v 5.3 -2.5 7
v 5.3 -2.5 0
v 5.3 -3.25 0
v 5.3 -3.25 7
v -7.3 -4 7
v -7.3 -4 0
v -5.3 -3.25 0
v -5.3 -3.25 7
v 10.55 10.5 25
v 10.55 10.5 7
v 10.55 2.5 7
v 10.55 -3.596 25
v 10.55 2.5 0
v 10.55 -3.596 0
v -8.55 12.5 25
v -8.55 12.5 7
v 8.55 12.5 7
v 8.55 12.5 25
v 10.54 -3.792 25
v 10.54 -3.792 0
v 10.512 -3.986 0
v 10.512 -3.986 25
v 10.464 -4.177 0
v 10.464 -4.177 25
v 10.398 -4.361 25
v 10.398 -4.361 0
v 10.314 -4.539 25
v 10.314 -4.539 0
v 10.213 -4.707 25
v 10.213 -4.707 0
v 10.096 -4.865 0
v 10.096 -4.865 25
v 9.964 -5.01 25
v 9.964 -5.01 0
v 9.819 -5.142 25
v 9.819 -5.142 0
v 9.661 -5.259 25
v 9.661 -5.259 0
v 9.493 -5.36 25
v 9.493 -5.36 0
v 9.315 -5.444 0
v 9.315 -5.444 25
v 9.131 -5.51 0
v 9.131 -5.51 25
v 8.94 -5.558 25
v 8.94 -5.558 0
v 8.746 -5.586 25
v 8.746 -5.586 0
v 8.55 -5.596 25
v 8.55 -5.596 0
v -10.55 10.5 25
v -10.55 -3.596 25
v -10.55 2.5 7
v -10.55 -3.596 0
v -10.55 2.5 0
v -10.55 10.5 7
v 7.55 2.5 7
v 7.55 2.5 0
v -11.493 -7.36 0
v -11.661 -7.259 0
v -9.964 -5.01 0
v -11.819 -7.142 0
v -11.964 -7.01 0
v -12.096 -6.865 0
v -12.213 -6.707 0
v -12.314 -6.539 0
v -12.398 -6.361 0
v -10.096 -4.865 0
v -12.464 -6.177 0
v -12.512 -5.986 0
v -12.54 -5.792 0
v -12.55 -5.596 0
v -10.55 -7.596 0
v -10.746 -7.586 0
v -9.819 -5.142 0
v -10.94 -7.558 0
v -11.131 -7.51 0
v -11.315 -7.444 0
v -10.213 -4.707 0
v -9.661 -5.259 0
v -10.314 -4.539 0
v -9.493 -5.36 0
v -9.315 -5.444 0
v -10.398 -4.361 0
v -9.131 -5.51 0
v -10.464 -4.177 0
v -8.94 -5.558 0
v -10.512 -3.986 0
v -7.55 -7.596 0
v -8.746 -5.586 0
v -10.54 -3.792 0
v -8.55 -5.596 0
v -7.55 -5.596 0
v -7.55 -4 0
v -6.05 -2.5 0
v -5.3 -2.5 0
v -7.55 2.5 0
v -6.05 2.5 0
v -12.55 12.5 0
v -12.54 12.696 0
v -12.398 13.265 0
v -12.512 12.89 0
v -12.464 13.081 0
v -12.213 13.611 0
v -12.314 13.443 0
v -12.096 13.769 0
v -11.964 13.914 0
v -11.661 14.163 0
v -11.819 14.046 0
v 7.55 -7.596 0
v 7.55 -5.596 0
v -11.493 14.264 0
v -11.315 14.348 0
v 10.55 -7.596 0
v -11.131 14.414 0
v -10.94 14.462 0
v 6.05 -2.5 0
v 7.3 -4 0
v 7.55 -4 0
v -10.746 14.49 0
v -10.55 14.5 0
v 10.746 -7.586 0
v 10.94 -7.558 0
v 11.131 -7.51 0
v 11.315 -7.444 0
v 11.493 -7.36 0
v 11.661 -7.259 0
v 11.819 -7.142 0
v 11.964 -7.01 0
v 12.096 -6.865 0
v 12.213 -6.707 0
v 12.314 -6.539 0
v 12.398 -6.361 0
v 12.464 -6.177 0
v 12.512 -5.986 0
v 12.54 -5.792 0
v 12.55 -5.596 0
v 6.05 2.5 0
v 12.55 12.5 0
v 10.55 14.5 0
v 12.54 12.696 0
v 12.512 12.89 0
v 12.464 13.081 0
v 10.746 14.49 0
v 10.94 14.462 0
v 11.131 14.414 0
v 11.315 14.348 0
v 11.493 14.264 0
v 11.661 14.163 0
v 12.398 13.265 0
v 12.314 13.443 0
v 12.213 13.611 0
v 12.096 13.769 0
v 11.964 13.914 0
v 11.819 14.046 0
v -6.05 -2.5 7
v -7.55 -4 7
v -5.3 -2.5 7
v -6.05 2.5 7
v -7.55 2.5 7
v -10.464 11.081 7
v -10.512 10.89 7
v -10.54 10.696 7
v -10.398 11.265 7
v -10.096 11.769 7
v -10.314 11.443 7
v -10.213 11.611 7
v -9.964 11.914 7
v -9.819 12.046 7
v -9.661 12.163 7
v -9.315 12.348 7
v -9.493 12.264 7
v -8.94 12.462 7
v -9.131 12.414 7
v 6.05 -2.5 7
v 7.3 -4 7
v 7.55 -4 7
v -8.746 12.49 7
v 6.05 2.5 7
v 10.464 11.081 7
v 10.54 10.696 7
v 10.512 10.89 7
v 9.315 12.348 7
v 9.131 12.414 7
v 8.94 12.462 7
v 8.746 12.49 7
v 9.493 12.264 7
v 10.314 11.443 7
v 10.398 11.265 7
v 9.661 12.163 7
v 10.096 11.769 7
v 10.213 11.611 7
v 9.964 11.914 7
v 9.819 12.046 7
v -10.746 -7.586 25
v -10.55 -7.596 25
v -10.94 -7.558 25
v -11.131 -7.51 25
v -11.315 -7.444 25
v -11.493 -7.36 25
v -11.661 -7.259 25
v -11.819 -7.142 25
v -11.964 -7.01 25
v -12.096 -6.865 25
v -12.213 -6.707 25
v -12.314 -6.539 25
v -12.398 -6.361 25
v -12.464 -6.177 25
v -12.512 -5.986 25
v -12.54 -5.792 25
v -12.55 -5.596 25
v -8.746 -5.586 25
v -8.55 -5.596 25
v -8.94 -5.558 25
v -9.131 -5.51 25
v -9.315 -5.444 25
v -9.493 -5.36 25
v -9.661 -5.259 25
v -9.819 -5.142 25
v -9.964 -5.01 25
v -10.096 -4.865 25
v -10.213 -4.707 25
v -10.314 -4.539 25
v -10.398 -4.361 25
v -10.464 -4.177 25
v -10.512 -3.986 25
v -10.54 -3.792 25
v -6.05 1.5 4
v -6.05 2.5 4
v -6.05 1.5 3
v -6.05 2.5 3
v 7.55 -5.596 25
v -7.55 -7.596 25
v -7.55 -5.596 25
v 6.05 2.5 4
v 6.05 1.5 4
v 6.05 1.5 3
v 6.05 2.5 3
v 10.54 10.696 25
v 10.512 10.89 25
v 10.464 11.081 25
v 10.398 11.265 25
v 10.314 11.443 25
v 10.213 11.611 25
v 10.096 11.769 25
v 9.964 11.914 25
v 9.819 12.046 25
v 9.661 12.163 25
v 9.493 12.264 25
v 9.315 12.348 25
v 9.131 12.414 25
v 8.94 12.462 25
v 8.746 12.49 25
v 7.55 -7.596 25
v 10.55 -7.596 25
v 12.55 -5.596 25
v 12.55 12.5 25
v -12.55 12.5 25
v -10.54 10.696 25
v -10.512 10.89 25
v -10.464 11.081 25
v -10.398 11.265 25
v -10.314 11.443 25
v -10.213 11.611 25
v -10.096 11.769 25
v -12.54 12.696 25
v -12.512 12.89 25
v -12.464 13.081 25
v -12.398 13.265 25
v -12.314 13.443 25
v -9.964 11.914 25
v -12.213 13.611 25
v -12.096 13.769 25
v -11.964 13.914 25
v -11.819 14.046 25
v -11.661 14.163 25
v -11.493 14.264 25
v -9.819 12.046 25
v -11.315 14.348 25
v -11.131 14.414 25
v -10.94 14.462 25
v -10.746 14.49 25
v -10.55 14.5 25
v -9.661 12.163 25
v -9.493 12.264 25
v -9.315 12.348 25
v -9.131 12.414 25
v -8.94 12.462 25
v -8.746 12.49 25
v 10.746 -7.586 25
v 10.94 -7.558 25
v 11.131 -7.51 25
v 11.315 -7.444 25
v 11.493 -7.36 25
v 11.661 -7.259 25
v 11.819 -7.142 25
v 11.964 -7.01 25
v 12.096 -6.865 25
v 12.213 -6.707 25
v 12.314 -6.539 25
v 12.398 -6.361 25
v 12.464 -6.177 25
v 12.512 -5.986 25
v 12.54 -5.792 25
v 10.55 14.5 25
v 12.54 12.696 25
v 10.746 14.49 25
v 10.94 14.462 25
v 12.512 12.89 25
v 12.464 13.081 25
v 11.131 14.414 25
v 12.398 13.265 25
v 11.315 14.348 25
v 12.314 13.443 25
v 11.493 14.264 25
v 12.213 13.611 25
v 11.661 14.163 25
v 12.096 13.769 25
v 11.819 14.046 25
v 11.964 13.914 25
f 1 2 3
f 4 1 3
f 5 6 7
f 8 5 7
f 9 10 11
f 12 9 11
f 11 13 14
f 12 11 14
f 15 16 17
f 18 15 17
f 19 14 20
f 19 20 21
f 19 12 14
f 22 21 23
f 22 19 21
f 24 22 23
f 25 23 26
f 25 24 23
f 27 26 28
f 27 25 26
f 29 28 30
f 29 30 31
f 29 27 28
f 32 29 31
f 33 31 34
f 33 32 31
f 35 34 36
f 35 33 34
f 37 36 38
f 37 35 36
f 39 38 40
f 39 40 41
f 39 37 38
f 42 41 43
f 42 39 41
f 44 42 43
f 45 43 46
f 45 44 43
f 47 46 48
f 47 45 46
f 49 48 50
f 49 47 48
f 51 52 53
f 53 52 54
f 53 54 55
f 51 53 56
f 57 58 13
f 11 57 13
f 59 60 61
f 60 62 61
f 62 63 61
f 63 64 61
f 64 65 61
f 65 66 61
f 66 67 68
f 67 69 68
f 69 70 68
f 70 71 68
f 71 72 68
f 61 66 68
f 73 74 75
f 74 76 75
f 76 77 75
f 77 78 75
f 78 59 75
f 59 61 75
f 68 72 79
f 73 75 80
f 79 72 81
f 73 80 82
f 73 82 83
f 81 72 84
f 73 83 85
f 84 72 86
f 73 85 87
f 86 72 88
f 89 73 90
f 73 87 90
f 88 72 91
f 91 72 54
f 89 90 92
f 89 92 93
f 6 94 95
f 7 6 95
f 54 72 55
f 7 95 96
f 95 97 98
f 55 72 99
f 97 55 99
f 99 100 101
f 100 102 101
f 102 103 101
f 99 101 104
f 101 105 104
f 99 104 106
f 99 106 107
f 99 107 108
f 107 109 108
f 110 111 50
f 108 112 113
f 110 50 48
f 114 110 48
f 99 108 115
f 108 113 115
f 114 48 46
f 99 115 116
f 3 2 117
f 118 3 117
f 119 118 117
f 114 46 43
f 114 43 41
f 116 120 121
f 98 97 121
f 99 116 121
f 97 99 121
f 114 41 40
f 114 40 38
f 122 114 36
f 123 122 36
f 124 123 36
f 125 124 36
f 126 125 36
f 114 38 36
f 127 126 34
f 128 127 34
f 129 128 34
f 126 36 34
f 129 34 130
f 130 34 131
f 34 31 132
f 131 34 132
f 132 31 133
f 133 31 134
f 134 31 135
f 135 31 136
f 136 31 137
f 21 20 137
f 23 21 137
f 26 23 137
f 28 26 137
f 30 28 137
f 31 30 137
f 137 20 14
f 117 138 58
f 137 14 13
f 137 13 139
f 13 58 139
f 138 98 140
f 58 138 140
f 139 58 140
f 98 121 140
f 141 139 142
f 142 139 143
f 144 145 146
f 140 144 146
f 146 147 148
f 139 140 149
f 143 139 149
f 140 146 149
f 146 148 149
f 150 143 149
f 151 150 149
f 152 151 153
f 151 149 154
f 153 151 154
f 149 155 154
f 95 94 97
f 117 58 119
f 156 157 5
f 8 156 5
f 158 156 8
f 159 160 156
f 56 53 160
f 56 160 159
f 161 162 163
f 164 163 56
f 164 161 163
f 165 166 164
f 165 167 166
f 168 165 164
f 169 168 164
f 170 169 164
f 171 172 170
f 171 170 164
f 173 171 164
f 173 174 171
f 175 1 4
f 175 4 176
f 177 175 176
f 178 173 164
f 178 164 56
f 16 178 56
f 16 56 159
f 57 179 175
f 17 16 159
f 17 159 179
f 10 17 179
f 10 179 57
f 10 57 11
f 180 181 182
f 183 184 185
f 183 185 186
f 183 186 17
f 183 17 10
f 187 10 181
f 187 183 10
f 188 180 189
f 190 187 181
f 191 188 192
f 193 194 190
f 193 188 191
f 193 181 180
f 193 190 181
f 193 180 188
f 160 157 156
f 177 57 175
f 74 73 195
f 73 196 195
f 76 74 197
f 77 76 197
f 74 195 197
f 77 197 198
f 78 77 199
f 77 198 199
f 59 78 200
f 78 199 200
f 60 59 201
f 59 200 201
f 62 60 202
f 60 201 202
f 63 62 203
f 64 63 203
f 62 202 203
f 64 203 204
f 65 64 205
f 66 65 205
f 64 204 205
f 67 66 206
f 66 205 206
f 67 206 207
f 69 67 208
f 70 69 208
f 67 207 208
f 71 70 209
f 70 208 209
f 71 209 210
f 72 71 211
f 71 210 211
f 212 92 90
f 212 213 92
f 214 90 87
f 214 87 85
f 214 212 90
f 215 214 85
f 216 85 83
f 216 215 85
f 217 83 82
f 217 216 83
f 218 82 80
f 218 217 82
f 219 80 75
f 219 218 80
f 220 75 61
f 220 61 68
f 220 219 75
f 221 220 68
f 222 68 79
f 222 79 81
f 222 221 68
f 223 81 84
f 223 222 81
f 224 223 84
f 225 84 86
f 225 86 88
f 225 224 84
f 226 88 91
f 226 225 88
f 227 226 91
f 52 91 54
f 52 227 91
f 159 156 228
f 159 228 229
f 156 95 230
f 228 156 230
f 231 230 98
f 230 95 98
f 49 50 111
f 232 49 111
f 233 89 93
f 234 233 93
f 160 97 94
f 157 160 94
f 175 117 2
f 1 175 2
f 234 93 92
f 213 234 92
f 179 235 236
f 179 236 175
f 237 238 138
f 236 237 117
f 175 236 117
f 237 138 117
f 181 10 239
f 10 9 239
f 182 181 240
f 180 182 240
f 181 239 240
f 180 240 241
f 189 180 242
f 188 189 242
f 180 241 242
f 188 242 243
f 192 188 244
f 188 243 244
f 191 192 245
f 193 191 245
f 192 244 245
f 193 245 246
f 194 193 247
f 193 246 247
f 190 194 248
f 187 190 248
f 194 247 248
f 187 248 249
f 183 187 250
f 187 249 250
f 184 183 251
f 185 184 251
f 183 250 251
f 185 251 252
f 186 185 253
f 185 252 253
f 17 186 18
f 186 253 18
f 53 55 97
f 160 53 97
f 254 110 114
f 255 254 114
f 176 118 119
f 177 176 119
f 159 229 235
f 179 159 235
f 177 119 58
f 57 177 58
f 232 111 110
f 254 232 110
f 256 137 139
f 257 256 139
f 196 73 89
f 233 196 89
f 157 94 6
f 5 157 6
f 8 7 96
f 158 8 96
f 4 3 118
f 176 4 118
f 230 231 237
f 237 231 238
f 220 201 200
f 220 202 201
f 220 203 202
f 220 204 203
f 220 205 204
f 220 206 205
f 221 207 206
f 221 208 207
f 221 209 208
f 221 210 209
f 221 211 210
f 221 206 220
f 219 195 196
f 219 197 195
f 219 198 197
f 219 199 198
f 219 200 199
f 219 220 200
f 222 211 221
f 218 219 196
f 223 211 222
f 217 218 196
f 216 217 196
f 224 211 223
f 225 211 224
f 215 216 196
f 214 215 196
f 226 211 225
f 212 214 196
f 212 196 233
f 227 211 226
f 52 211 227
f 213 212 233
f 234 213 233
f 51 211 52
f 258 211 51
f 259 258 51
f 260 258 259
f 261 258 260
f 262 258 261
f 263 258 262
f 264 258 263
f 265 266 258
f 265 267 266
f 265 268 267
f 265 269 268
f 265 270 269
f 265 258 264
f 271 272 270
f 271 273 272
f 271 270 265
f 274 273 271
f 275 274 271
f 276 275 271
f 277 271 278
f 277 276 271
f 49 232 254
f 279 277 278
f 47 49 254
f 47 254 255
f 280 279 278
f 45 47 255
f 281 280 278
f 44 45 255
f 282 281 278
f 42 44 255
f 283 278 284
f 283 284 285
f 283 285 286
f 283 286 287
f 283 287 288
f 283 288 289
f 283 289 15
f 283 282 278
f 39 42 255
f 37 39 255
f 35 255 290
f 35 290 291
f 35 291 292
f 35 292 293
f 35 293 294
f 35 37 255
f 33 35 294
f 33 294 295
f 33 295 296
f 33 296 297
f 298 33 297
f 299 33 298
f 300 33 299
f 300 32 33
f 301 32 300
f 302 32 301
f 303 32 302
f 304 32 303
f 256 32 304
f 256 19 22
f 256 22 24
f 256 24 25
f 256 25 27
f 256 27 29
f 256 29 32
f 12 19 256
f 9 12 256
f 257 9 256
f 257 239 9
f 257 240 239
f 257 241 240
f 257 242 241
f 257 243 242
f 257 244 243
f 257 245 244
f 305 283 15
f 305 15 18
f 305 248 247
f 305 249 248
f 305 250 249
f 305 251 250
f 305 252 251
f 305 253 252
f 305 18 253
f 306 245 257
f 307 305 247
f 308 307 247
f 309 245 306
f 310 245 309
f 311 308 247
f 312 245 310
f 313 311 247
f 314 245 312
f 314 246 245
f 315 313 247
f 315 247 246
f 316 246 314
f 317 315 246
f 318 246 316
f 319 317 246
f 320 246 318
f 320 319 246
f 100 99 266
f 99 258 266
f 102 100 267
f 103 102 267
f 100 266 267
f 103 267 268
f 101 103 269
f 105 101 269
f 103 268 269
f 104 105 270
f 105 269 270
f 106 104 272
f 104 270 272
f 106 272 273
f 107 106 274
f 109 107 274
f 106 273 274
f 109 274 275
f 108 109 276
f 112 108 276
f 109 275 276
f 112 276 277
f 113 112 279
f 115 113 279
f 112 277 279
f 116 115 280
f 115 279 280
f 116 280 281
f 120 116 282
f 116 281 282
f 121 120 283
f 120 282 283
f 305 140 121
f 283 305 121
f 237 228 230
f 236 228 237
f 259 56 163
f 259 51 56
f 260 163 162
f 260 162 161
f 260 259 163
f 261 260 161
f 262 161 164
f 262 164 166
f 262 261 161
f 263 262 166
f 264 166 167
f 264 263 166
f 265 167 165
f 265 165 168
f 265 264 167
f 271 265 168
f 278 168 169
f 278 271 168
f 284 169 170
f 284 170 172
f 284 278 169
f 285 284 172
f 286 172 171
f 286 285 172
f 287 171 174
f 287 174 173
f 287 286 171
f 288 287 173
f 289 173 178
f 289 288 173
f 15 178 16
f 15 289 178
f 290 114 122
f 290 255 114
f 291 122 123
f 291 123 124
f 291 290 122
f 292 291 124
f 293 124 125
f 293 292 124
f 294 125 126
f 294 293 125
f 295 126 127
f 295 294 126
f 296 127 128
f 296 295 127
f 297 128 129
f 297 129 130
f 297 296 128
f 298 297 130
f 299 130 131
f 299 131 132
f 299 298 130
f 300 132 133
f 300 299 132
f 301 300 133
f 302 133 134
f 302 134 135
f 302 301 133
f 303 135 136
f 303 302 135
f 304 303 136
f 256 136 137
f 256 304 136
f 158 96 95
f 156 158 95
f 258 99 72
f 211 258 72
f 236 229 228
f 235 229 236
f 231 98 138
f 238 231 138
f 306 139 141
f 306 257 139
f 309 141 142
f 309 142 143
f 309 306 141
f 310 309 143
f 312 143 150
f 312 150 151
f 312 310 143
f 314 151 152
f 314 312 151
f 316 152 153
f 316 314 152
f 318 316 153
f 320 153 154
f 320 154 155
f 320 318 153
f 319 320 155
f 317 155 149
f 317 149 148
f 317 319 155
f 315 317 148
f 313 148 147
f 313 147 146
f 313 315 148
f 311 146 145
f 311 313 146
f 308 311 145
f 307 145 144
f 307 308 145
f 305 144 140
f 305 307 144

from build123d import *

# Parameters (mm, degrees)
F2_DEPTH = 7
F3_W     = 12.1
F3_H     = 1
F4_DEPTH = 1
F6_DEPTH = 7
F7_DEPTH = 25
F8_R     = 2


with BuildPart() as f2:
    # F1 (on face) → F2 (new body)
    with BuildSketch(Plane.XY):
        Polygon((-6.05, 2.5), (0, 2.5), (0, 4.5), (-7.55, 4.5), (-7.55, -4), (-7.3, -4), (-5.3, -3.25), (-5.3, -2.5), (-6.05, -2.5), align=None)
        Polygon((0, 4.5), (0, 2.5), (6.05, 2.5), (6.05, -2.5), (5.3, -2.5), (5.3, -3.25), (7.3, -4), (7.55, -4), (7.55, 4.5), align=None)
    extrude(amount=F2_DEPTH)

    # F3 (on face) → F4 (join)
    with BuildSketch(Plane.XZ.offset(-2.5)):
        with Locations((0, 3.5)):
            Rectangle(F3_W, F3_H)
    extrude(amount=F4_DEPTH)

    # F5 (on Top) → F6 (join)
    with BuildSketch(Plane.XY):
        Polygon((-10.55, 2.5), (-7.55, 2.5), (-7.55, 4.5), (0, 4.5), (0, 12.5), (-10.55, 12.5), align=None)
        Polygon((0, 12.5), (0, 4.5), (7.55, 4.5), (7.55, 2.5), (10.55, 2.5), (10.55, 12.5), align=None)
    extrude(amount=F6_DEPTH)

    # F5 (on Top) → F7 (join)
    with BuildSketch(Plane.XY):
        Polygon((-7.55, -7.5960563503), (-7.55, -5.5960563503), (-10.55, -5.5960563503), (-10.55, 2.5), (-10.55, 12.5), (0, 12.5), (0, 14.5), (-12.55, 14.5), (-12.55, -7.5960563503), align=None)
        Polygon((0, 14.5), (0, 12.5), (10.55, 12.5), (10.55, 2.5), (10.55, -5.5960563503), (7.55, -5.5960563503), (7.55, -7.5960563503), (12.55, -7.5960563503), (12.55, 14.5), align=None)
    extrude(amount=F7_DEPTH)

    # F8
    f8_edges = [f2.edges().sort_by_distance(p)[0] for p in [
        (12.55, -7.596056, 12.5),
        (10.55, -5.596056, 12.5),
        (-12.55, -7.596056, 12.5),
        (-12.55, 14.5, 12.5),
        (12.55, 14.5, 12.5),
        (-10.55, -5.596056, 12.5),
        (-10.55, 12.5, 16),
        (10.55, 12.5, 16),
    ]]
    fillet(f8_edges, radius=F8_R)


solid = f2.part
